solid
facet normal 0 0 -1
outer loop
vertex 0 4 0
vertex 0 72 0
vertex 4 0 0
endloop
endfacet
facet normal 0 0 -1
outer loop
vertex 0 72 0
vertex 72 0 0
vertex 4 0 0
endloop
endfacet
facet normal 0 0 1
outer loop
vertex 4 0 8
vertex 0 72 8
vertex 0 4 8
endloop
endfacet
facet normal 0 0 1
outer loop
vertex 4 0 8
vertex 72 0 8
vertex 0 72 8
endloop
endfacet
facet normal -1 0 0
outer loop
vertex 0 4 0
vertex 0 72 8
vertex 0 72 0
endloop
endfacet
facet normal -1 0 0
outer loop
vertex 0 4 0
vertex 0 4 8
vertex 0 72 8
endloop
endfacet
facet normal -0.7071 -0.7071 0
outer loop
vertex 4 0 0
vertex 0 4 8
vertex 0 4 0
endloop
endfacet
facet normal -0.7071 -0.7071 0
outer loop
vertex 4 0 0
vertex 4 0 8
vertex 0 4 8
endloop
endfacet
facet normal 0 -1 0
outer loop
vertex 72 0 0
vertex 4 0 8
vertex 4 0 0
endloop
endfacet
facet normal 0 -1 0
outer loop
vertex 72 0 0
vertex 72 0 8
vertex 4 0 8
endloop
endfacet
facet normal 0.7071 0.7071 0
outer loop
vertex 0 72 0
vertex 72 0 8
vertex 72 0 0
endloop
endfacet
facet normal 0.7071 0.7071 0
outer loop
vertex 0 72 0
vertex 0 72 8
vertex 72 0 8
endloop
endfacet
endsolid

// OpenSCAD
a=4;
b=8;
c=72;

linear_extrude(height=b)
    polygon(points=[[0,a], [a,0], [c,0], [0,c]]);
